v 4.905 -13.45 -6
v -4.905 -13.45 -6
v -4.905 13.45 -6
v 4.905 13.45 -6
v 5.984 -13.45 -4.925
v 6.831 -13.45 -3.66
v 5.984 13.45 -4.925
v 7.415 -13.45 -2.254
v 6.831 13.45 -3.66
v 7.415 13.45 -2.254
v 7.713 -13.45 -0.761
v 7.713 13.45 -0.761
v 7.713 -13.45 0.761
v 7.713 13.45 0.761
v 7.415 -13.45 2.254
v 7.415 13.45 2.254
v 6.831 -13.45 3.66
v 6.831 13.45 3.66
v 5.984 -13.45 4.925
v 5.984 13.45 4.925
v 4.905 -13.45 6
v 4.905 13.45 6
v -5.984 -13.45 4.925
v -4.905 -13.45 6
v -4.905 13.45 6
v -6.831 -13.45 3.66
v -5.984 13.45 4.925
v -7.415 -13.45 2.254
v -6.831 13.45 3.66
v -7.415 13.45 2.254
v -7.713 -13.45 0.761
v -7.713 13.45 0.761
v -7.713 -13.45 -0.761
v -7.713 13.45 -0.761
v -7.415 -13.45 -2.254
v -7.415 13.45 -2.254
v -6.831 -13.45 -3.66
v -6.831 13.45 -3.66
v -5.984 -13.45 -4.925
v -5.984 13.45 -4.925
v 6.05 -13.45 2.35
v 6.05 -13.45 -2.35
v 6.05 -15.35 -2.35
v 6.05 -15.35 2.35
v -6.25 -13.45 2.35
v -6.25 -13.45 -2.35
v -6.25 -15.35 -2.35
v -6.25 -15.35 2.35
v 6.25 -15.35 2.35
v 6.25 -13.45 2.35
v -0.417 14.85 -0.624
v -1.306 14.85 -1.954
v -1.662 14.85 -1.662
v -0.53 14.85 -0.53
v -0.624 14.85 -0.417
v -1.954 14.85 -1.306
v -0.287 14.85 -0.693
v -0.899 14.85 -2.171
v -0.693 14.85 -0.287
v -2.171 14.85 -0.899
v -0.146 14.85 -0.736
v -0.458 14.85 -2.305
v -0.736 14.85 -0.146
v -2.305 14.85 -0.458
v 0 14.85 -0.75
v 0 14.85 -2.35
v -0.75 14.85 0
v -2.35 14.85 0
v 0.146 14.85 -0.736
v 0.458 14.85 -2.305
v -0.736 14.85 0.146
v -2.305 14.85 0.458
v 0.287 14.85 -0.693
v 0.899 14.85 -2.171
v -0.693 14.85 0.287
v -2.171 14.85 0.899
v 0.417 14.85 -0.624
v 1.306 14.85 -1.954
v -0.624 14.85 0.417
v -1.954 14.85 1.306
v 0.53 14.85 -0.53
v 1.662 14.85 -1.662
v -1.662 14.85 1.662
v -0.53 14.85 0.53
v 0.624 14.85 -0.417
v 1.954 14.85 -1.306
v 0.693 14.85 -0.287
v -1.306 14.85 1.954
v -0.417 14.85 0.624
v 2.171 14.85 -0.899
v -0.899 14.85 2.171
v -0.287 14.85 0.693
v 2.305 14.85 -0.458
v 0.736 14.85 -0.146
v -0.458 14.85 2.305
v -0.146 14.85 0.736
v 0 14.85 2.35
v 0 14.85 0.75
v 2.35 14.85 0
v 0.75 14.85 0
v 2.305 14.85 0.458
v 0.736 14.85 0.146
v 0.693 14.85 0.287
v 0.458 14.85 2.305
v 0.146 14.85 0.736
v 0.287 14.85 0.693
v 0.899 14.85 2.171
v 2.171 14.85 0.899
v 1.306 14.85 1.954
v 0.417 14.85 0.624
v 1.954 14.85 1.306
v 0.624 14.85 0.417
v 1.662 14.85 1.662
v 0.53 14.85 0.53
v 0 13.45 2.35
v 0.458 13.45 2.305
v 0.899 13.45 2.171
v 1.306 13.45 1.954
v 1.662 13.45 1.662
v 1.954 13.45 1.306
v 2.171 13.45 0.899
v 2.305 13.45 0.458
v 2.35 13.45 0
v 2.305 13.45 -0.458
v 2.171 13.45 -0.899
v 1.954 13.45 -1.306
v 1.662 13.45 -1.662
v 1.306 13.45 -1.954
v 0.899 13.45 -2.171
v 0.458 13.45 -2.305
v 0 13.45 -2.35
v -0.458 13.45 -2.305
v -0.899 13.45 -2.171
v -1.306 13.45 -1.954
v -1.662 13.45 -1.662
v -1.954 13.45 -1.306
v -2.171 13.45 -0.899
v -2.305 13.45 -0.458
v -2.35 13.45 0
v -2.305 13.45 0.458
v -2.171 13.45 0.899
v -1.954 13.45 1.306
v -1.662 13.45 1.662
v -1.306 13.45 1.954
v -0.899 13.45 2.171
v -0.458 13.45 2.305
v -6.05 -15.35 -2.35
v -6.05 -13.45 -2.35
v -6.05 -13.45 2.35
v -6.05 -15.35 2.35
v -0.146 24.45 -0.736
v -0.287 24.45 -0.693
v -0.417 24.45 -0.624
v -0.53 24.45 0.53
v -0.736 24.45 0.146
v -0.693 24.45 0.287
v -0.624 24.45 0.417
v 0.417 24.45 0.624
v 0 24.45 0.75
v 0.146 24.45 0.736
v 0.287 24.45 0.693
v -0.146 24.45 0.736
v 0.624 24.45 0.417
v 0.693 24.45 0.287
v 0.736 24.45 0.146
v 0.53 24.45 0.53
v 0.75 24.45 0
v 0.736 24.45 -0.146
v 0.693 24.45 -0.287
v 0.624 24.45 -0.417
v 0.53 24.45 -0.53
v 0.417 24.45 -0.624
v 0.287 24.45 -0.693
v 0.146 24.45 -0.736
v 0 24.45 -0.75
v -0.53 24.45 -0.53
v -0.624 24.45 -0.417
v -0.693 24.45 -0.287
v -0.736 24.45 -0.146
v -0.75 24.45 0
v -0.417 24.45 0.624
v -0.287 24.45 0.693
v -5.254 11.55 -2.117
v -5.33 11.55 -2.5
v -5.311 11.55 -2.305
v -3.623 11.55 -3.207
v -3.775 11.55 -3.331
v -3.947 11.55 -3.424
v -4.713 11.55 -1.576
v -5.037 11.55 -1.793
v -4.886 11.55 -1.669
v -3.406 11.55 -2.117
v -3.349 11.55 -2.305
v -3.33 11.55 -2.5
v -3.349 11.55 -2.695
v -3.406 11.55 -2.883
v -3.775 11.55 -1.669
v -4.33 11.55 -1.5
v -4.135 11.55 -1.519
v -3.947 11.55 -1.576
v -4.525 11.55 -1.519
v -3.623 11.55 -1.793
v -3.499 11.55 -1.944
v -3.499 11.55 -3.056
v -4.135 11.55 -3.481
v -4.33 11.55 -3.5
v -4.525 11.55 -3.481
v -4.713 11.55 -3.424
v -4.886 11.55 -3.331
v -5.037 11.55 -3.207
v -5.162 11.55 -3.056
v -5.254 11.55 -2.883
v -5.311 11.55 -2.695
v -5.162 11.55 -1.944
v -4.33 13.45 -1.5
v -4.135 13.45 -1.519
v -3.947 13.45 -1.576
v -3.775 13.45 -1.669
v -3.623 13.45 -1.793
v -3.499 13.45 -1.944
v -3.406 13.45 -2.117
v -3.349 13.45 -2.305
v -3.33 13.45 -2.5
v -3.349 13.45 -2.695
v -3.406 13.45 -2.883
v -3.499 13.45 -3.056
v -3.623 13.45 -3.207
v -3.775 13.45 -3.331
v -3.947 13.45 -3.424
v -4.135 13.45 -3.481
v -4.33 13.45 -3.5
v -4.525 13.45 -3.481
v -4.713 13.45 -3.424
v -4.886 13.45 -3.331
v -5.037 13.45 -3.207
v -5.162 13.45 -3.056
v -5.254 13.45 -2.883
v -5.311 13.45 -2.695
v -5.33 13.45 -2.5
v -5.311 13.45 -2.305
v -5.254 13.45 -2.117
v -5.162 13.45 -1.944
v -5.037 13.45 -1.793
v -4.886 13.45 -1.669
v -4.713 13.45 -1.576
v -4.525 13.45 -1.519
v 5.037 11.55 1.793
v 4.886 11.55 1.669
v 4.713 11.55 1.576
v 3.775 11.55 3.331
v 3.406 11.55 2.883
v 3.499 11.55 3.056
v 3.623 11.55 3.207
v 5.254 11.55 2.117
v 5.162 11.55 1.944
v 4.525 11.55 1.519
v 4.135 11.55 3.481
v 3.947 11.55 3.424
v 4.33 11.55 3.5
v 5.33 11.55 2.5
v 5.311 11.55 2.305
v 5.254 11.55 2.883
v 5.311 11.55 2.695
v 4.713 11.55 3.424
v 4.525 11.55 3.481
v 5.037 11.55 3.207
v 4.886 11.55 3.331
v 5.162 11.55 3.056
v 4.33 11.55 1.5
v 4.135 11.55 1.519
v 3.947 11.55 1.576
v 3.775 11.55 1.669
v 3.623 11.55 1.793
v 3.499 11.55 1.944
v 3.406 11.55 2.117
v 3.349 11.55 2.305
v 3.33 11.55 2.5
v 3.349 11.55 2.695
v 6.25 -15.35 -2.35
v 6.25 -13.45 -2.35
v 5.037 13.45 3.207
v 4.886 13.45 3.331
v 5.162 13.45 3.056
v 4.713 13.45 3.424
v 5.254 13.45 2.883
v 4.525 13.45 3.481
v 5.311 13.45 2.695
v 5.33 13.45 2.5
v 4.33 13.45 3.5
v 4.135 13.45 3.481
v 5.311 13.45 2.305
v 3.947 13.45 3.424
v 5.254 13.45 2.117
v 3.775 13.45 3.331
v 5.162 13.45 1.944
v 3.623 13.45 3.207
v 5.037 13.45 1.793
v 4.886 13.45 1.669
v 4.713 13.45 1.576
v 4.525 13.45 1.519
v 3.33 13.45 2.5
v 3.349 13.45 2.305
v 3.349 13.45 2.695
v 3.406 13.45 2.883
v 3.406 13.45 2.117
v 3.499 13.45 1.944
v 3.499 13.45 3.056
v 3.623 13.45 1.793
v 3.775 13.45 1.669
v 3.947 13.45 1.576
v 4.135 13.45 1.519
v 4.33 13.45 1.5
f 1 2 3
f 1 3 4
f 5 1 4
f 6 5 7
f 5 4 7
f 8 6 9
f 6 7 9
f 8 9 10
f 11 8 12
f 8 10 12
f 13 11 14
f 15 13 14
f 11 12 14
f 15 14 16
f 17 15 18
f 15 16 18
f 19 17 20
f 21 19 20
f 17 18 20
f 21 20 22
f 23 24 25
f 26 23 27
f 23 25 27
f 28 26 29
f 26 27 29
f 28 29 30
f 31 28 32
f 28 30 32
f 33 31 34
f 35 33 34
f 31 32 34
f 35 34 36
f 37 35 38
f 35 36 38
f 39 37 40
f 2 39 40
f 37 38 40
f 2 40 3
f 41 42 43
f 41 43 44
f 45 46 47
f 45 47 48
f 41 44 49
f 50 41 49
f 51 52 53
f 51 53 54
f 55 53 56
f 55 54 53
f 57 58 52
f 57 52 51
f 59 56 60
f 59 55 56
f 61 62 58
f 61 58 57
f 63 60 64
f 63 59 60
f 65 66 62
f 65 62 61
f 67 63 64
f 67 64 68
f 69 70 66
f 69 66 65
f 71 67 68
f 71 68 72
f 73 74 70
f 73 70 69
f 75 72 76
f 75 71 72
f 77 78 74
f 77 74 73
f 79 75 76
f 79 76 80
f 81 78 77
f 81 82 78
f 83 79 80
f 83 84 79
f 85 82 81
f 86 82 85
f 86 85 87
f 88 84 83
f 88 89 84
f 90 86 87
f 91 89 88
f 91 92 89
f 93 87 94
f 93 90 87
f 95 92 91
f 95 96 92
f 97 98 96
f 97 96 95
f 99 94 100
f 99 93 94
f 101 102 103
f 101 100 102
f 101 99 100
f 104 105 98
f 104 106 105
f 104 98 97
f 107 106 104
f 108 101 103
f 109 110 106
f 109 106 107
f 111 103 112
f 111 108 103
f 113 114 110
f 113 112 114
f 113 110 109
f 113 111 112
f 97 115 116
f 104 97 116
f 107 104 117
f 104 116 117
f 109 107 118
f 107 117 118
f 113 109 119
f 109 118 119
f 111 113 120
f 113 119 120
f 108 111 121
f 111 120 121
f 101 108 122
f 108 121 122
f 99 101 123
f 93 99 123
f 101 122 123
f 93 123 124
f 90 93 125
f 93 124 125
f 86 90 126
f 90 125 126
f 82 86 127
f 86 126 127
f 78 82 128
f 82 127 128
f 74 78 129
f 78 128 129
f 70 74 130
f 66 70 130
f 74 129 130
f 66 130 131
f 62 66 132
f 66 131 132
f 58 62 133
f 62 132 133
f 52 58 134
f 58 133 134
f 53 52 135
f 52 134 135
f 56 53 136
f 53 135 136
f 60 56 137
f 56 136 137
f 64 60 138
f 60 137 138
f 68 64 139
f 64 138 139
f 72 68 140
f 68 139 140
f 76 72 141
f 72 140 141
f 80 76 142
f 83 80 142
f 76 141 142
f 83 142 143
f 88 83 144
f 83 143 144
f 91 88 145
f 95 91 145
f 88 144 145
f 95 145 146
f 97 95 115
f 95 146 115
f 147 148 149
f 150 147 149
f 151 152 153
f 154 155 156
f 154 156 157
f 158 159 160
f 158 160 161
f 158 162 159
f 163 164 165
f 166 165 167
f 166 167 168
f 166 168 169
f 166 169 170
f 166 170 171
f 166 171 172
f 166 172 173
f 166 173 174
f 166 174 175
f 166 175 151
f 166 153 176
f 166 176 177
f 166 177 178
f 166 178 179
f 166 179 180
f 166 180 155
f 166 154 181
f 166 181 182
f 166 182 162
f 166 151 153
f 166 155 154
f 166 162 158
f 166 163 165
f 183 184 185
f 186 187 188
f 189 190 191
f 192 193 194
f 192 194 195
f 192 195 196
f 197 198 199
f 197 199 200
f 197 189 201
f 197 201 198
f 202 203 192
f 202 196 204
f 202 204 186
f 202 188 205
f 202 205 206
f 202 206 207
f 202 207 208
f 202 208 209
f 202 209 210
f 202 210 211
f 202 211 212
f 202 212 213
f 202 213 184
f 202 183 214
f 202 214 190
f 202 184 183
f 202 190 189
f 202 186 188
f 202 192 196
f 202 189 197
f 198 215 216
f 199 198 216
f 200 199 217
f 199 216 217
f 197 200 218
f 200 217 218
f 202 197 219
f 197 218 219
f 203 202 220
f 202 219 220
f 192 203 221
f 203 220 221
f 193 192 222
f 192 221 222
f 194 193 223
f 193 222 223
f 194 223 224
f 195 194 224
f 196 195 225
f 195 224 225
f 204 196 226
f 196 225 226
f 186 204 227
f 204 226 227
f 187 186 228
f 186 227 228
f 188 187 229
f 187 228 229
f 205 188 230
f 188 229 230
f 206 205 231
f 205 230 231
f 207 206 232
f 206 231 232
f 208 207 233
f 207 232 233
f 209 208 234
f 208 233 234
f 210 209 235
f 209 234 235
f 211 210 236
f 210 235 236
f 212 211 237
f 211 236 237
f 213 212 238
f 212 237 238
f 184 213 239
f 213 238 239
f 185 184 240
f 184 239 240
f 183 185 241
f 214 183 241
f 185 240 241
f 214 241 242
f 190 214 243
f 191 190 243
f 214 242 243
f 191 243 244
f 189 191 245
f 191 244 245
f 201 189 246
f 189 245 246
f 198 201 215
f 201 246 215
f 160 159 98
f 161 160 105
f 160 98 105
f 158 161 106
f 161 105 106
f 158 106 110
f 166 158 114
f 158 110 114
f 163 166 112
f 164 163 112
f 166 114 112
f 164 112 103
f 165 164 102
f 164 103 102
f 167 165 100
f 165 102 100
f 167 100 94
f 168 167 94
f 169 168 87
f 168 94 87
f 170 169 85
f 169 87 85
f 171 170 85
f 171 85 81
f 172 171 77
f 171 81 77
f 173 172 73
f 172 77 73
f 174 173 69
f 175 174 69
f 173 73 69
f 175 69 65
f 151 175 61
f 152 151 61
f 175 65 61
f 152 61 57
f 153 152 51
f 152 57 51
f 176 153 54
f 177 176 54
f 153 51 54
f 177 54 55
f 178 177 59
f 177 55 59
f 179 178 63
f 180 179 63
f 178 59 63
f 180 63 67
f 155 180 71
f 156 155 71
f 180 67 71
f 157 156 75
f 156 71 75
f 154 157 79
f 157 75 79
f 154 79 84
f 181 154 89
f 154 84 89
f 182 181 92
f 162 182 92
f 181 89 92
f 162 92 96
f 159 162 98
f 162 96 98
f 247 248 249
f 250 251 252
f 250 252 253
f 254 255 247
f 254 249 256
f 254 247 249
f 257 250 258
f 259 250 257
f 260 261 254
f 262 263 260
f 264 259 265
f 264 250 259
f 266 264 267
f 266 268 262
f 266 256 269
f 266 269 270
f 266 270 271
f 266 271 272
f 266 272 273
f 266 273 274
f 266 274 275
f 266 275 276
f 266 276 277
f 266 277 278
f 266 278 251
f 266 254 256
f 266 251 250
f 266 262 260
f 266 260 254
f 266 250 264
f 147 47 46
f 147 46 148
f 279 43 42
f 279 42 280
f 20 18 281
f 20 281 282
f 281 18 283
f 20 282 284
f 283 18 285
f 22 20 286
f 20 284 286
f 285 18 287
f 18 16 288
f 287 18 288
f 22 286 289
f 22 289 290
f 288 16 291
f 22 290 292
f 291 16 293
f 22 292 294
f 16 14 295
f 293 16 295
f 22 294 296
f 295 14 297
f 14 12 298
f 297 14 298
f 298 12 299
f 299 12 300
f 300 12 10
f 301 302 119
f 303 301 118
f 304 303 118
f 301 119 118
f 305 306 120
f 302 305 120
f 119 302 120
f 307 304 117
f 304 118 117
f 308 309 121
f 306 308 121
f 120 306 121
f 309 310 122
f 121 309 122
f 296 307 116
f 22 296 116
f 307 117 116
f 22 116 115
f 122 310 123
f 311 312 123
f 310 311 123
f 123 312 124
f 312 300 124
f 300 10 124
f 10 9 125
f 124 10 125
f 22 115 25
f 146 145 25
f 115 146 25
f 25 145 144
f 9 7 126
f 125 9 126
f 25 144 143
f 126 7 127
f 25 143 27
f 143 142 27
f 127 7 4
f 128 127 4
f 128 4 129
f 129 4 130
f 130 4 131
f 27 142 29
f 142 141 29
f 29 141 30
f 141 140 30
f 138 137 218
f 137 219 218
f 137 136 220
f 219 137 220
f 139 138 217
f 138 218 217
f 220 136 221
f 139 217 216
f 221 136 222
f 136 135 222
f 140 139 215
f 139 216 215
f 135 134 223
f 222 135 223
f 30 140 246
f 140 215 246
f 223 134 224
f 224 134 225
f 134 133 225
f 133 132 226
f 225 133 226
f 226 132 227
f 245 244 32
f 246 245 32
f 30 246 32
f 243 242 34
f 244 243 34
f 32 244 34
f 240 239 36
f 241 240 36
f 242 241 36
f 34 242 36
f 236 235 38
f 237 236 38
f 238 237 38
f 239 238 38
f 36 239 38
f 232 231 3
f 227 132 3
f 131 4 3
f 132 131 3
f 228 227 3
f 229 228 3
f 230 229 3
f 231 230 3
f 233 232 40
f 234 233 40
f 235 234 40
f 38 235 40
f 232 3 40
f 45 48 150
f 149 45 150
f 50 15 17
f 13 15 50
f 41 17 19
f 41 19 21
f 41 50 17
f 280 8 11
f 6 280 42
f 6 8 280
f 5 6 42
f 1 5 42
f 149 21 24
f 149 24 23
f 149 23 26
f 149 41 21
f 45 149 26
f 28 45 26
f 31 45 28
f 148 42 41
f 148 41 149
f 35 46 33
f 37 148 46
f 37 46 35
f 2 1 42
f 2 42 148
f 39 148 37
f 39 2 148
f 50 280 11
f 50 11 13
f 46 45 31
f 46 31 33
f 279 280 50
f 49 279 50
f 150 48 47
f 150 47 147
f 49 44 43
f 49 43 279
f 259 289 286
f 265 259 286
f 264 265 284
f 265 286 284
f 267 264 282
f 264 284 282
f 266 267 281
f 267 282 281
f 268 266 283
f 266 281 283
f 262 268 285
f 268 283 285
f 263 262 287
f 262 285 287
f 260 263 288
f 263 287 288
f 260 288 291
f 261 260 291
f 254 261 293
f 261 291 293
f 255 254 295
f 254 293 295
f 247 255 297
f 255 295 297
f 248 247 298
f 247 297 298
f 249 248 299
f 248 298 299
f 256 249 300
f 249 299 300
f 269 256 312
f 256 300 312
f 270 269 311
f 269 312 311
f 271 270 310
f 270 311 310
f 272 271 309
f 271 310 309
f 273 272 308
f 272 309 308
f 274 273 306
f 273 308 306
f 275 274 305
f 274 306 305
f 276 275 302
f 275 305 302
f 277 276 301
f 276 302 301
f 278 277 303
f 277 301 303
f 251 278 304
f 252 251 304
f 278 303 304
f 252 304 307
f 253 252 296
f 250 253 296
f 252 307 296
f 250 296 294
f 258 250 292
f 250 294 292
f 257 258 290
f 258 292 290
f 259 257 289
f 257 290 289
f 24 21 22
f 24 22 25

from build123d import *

# Parameters (mm, degrees)
BOSS_EXTRUDE1_DEPTH = 13.45
SKETCH2_R           = 2.35
BOSS_EXTRUDE2_DEPTH = 1.4
SKETCH3_R           = 0.75
BOSS_EXTRUDE5_DEPTH = 9.6
SKETCH4_W           = 0.2
SKETCH4_H           = 4.7
BOSS_EXTRUDE6_DEPTH = 1.9
SKETCH5_R           = 1
CUT_EXTRUDE1_DEPTH  = 1.9


with BuildPart() as part:
    # Sketch1 → Boss-Extrude1 (new, symmetric)
    with BuildSketch(Plane(origin=(0, 0, 0), x_dir=(1, 0, 0), z_dir=(0, 1, 0))):
        with BuildLine():
            Line((-4.905354218, 6), (4.905354218, 6))
            ThreePointArc((4.905354218, 6), (7.75, 0), (4.905354218, -6))
            Line((4.905354218, -6), (-4.905354218, -6))
            ThreePointArc((-4.905354218, -6), (-7.75, 0), (-4.905354218, 6))
        make_face()
    extrude(amount=BOSS_EXTRUDE1_DEPTH, both=True)

    # Sketch2 → Boss-Extrude2 (add)
    with BuildSketch(Plane(origin=(0, 13.45, 0), x_dir=(1, 0, 0), z_dir=(0, 1, 0))):
        with Locations(Location((0, 0, 0), (0, 0, 270))):
            Circle(SKETCH2_R)
    extrude(amount=BOSS_EXTRUDE2_DEPTH)

    # Sketch3 → Boss-Extrude5 (add)
    with BuildSketch(Plane(origin=(0, 14.85, 0), x_dir=(1, 0, 0), z_dir=(0, 1, 0))):
        with Locations(Location((0, 0, 0), (0, 0, 270))):
            Circle(SKETCH3_R)
    extrude(amount=BOSS_EXTRUDE5_DEPTH)

    # Sketch4 → Boss-Extrude6 (add)
    with BuildSketch(Plane.XZ.offset(13.45)):
        with Locations((-6.15, 0)):
            Rectangle(SKETCH4_W, SKETCH4_H)
        with Locations((6.15, 0)):
            Rectangle(SKETCH4_W, SKETCH4_H)
    extrude(amount=BOSS_EXTRUDE6_DEPTH)

    # Sketch5 → Cut-Extrude1 (cut)
    with BuildSketch(Plane(origin=(0, 13.45, 0), x_dir=(1, 0, 0), z_dir=(0, 1, 0))):
        with Locations(Location((-4.330127019, 2.5, 0), (0, 0, 270))):
            Circle(SKETCH5_R)
        with Locations(Location((4.330127019, -2.5, 0), (0, 0, 270))):
            Circle(SKETCH5_R)
    extrude(amount=-CUT_EXTRUDE1_DEPTH, mode=Mode.SUBTRACT)


solid = part.part
